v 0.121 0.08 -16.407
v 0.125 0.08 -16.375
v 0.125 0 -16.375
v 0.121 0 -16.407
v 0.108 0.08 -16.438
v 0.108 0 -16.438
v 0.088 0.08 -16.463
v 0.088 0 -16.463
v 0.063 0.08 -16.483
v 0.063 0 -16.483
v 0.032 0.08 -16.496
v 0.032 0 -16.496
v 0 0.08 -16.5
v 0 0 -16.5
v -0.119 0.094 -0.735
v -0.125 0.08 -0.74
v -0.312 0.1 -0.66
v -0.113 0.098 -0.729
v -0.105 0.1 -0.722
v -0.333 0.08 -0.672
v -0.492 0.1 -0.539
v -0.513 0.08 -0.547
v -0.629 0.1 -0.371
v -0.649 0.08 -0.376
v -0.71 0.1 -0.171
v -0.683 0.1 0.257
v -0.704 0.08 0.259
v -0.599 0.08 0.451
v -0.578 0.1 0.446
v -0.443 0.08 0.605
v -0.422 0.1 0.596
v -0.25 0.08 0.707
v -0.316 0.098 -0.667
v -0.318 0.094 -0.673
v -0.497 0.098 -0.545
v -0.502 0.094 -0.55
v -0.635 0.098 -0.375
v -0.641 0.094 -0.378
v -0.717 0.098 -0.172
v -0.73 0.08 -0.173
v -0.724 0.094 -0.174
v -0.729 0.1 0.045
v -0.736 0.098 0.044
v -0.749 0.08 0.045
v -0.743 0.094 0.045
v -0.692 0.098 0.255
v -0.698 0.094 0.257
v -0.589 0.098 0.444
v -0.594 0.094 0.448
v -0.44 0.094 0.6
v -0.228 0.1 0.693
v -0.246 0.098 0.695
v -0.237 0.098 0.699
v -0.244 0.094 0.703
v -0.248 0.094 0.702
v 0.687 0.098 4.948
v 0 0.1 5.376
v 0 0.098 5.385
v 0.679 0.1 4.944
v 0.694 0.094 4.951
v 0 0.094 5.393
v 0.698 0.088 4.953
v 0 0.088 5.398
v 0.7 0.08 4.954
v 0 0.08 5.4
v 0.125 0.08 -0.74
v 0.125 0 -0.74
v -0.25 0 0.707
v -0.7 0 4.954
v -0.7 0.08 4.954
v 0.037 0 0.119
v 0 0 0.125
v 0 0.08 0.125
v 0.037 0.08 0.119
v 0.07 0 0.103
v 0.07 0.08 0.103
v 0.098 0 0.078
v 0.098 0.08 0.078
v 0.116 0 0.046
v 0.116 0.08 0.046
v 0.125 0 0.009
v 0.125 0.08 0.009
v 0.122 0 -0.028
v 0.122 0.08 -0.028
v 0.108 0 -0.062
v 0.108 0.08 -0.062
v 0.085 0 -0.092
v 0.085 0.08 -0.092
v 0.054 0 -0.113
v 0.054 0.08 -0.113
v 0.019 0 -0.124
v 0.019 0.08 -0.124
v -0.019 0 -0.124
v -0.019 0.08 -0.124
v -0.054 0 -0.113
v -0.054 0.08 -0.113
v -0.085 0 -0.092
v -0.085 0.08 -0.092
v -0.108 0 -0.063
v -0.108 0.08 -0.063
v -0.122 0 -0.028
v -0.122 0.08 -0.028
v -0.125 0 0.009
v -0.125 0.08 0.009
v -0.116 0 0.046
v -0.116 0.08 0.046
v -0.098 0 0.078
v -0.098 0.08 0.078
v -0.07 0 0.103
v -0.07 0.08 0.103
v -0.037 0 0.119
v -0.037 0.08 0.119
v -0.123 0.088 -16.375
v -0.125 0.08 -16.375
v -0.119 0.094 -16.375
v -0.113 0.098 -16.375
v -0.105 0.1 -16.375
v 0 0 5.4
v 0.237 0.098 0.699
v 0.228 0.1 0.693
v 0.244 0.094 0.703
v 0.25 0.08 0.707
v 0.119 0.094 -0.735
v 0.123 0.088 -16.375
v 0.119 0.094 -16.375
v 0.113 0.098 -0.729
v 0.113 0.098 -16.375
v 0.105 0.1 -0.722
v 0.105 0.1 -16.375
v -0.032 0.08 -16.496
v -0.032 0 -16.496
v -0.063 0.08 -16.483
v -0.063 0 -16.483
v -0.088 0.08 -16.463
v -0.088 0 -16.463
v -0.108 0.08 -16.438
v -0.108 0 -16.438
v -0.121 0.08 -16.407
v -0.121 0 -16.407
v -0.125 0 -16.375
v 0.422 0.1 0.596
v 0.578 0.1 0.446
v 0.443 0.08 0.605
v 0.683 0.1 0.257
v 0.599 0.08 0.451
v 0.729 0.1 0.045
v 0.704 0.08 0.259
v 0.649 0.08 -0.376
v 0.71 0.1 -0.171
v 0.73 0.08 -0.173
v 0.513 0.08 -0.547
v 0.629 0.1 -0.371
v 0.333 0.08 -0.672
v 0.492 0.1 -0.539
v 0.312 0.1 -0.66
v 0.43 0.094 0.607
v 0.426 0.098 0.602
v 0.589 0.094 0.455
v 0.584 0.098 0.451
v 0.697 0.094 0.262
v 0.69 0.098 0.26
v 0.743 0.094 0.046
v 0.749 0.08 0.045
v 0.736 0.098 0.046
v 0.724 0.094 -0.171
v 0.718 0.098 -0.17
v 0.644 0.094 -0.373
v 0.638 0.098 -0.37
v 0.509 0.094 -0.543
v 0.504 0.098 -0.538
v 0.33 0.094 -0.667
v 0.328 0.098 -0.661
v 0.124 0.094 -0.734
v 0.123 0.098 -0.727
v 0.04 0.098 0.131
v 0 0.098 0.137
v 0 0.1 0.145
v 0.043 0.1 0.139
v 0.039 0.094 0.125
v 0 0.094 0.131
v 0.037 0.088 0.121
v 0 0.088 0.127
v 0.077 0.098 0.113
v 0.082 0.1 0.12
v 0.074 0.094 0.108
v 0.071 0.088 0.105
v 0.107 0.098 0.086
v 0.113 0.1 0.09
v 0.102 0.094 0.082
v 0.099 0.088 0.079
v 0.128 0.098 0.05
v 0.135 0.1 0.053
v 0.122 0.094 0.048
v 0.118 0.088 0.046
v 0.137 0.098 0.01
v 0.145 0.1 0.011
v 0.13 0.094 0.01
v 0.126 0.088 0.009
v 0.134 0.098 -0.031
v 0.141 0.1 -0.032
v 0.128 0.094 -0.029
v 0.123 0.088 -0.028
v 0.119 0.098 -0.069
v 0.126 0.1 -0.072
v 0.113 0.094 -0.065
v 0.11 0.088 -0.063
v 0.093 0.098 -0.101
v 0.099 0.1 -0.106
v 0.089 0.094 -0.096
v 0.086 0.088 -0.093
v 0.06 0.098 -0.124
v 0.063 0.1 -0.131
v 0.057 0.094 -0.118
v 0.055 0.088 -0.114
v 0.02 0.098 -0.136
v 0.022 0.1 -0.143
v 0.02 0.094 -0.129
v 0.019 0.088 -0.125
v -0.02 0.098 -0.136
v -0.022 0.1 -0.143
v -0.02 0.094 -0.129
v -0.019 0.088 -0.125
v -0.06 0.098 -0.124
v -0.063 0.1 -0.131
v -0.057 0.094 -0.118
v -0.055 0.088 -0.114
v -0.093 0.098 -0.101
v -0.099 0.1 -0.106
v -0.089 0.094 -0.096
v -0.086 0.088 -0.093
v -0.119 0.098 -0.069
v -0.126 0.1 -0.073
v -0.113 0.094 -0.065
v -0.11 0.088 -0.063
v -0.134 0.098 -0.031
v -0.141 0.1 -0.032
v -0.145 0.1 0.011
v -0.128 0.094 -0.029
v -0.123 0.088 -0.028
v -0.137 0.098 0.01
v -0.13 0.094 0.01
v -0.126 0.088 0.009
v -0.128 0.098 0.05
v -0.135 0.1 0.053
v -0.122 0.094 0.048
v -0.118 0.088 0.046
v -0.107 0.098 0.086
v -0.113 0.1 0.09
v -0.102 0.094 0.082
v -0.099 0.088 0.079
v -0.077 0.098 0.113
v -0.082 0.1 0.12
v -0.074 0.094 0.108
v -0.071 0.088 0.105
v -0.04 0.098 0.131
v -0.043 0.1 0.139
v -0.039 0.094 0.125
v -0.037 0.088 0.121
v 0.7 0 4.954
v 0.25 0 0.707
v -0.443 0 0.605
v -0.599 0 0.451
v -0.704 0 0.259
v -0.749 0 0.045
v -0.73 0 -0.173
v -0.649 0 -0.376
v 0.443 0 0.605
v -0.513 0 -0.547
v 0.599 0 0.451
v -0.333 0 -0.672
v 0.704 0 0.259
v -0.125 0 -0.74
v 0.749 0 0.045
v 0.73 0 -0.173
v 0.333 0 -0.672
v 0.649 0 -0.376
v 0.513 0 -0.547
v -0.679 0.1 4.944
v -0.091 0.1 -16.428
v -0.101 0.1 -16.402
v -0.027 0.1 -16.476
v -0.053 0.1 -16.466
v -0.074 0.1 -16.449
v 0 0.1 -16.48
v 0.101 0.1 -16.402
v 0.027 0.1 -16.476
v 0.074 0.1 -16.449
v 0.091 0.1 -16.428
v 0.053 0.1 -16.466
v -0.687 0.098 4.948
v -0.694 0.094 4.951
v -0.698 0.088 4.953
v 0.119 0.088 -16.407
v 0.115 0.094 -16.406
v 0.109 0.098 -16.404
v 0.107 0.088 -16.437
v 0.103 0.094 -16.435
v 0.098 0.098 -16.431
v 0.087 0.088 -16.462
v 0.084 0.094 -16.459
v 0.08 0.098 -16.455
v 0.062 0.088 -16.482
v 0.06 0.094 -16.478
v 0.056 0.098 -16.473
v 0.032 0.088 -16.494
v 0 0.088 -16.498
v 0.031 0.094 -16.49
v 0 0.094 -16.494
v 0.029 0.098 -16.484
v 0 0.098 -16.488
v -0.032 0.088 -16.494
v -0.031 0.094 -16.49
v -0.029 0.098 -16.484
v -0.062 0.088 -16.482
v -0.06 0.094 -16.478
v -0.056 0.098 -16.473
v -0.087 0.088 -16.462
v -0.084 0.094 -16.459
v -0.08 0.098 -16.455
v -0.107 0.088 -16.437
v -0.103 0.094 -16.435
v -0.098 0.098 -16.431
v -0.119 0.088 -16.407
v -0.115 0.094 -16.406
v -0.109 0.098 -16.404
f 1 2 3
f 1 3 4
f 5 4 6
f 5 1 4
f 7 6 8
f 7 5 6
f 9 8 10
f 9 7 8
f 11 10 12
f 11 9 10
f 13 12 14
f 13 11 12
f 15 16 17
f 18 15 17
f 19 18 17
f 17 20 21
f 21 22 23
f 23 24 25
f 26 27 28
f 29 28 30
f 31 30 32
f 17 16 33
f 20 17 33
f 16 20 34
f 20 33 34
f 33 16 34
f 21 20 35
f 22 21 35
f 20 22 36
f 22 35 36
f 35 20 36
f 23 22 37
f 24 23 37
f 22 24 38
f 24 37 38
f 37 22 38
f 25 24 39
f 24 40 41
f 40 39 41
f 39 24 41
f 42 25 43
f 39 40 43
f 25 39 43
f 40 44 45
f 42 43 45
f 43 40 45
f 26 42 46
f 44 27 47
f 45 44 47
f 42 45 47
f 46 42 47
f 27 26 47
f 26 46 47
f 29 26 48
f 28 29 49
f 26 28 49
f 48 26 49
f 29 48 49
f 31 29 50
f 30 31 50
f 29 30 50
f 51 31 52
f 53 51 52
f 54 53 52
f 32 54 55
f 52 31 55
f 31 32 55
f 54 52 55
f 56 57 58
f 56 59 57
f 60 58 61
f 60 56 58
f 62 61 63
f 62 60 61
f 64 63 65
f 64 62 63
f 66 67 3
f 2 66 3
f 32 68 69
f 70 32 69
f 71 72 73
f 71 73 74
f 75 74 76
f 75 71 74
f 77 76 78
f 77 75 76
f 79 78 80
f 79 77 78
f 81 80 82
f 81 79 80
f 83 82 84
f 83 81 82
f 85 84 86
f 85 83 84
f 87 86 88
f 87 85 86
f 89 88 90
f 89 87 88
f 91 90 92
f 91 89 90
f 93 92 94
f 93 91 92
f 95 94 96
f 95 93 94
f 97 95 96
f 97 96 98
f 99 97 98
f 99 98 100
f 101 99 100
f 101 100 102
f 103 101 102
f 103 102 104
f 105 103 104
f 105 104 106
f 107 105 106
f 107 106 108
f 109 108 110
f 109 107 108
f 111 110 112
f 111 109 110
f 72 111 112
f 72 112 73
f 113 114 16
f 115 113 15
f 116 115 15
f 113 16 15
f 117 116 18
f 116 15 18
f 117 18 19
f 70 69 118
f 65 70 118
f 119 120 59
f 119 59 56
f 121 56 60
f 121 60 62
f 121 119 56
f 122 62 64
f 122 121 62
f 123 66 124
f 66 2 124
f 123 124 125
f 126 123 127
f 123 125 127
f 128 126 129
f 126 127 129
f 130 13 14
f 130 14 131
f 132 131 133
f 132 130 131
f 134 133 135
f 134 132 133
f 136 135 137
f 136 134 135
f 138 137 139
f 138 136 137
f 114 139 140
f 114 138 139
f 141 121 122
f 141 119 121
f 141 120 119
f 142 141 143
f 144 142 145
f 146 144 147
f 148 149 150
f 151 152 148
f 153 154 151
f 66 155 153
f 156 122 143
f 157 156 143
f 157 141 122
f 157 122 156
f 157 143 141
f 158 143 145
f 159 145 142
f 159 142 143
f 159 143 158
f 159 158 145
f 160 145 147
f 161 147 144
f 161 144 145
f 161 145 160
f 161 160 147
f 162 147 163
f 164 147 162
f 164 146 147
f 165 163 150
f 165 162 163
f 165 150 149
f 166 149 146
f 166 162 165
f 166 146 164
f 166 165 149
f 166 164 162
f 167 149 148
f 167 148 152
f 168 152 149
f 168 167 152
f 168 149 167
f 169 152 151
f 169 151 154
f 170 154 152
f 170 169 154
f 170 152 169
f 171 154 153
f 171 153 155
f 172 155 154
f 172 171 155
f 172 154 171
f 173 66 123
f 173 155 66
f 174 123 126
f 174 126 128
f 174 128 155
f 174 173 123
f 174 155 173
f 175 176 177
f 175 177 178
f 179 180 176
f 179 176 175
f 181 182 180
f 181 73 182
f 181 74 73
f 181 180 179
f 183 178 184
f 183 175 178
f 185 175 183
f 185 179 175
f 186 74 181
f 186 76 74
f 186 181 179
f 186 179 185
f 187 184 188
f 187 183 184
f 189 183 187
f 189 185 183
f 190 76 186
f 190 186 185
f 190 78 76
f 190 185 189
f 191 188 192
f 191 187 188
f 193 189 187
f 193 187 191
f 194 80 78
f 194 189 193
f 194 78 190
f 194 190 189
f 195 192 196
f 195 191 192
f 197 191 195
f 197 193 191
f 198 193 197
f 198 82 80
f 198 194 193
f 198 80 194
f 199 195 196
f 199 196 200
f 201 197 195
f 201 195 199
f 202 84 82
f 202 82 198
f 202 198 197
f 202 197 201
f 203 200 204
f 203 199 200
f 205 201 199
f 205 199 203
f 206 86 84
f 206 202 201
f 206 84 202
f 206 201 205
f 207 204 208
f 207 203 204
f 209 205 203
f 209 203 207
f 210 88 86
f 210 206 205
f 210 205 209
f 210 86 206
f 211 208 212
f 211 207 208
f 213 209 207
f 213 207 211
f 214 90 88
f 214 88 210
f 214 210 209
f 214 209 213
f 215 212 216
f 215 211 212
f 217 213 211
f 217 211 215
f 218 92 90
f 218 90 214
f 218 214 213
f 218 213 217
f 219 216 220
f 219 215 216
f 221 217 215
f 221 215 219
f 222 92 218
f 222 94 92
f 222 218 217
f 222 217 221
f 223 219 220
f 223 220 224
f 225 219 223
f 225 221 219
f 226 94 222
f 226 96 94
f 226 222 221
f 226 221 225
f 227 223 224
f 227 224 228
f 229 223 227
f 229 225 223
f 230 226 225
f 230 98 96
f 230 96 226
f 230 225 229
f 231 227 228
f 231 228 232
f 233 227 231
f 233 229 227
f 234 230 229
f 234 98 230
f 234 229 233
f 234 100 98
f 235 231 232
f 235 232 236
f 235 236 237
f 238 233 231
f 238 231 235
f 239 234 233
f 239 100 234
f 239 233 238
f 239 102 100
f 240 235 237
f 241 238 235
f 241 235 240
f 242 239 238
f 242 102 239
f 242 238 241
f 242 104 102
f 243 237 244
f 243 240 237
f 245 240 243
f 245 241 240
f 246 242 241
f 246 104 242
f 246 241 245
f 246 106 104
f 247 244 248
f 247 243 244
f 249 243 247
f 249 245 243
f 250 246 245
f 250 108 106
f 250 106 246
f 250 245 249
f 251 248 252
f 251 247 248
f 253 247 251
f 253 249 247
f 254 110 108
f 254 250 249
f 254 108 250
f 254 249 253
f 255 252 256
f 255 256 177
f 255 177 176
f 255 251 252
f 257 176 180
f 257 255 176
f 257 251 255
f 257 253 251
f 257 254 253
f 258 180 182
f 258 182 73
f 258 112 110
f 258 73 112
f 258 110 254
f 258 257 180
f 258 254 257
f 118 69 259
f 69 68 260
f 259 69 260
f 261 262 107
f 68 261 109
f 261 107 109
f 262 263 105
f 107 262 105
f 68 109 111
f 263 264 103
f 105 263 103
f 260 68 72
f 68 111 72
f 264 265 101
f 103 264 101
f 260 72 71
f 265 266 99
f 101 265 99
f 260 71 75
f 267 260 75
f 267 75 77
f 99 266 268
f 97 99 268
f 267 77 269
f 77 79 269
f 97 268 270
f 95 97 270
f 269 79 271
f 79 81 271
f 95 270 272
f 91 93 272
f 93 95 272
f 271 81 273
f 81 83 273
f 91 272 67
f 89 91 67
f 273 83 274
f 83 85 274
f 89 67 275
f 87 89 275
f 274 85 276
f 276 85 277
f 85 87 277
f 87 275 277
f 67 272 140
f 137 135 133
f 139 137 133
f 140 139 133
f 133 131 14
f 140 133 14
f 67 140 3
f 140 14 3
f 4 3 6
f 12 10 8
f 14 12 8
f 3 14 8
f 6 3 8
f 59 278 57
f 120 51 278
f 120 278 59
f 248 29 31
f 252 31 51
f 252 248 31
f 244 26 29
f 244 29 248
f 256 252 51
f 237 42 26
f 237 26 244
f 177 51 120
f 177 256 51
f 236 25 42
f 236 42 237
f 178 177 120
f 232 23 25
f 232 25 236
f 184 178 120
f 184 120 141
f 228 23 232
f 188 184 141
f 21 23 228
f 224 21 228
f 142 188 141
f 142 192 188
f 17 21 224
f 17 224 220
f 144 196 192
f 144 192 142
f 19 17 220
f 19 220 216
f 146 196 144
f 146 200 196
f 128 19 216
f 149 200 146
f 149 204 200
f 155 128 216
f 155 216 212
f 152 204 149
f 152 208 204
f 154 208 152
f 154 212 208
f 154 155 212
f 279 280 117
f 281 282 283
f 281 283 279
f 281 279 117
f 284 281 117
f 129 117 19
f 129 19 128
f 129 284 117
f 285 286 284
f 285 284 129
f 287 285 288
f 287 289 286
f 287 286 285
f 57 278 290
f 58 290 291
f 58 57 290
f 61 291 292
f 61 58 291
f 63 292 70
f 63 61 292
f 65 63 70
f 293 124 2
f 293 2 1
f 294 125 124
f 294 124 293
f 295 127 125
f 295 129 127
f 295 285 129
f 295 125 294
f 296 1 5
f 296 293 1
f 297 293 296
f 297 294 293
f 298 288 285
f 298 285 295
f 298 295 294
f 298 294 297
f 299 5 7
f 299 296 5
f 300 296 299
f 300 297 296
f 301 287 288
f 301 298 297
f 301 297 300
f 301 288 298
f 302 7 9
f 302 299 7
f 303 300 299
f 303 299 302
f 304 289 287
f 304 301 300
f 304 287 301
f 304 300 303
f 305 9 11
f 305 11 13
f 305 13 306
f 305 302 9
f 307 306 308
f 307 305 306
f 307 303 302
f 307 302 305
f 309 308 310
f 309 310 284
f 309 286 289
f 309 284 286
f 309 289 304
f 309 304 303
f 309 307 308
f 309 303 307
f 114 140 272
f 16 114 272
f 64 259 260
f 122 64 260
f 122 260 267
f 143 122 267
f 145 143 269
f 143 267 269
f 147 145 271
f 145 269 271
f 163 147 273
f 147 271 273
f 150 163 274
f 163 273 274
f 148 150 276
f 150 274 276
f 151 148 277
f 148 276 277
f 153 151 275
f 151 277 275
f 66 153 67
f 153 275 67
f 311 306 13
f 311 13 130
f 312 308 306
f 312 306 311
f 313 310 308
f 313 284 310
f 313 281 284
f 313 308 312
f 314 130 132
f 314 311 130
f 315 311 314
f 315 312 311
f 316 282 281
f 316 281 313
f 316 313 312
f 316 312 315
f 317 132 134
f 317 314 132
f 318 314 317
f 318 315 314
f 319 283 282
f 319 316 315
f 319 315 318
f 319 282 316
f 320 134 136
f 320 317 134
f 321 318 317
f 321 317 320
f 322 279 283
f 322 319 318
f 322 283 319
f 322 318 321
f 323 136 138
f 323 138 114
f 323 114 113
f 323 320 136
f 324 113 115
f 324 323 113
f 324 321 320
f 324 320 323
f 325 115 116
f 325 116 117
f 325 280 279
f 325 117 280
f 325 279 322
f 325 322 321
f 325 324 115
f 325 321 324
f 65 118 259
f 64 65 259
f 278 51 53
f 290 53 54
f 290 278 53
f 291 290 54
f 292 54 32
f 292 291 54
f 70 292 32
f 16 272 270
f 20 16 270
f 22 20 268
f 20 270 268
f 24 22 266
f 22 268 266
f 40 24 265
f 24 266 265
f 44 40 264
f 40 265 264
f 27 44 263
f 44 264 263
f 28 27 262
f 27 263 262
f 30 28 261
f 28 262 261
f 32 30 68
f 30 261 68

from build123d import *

# Parameters (mm, degrees)
SKETCH_3_R      = 0.125
EXTRUDE_1_DEPTH = 0.1
FILLET_1_R      = 0.125
FILLET_2_R      = 0.02


with BuildPart() as part:
    # 草图3 → 凸台-拉伸1 (new body)
    with BuildSketch(Plane(origin=(0, 0, 0), x_dir=(1, 0, 0), z_dir=(0, 1, 0))):
        with BuildLine():
            Line((0.125, 0.739509973), (0.125, 16.5))
            Line((0.125, 16.5), (-0.125, 16.5))
            Line((-0.125, 16.5), (-0.125, 0.739509973))
            ThreePointArc((-0.125, 0.739509973), (-0.747215671, 0.064565794), (-0.25, -0.707106781))
            Line((-0.25, -0.707106781), (-0.7, -4.954050817))
            Line((-0.7, -4.954050817), (0, -5.4))
            Line((0, -5.4), (0.7, -4.954050817))
            Line((0.7, -4.954050817), (0.25, -0.707106781))
            ThreePointArc((0.25, -0.707106781), (0.747215671, 0.064565794), (0.125, 0.739509973))
        make_face()
        with Locations(Location((0, 0, 0), (0, 0, 270))):
            Circle(SKETCH_3_R, mode=Mode.SUBTRACT)
    extrude(amount=EXTRUDE_1_DEPTH)

    # 圆角1
    fillet_1_edges = [part.edges().sort_by_distance(p)[0] for p in [
        (-0.125, 0.05, -16.5),
        (0.125, 0.05, -16.5),
    ]]
    fillet(fillet_1_edges, radius=FILLET_1_R - 0.0001)  # a hair under: the kernel refuses the full size

    # 圆角2
    fillet_2_edges = [part.edges().sort_by_distance(p)[0] for p in [
        (0.747215671, 0.1, -0.064565794),
        (0.125, 0.1, -8.557304986),
        (-0.747215671, 0.1, -0.064565794),
        (0, 0.1, -0.125),
        (-0.475, 0.1, 2.830578799),
        (-0.35, 0.1, 5.177025409),
        (-0.125, 0.1, -8.557304986),
        (0.088417637, 0.1, -16.463417637),
        (-0.088417637, 0.1, -16.463417637),
        (0.35, 0.1, 5.177025409),
        (0.475, 0.1, 2.830578799),
    ]]
    fillet(fillet_2_edges, radius=FILLET_2_R)


solid = part.part
